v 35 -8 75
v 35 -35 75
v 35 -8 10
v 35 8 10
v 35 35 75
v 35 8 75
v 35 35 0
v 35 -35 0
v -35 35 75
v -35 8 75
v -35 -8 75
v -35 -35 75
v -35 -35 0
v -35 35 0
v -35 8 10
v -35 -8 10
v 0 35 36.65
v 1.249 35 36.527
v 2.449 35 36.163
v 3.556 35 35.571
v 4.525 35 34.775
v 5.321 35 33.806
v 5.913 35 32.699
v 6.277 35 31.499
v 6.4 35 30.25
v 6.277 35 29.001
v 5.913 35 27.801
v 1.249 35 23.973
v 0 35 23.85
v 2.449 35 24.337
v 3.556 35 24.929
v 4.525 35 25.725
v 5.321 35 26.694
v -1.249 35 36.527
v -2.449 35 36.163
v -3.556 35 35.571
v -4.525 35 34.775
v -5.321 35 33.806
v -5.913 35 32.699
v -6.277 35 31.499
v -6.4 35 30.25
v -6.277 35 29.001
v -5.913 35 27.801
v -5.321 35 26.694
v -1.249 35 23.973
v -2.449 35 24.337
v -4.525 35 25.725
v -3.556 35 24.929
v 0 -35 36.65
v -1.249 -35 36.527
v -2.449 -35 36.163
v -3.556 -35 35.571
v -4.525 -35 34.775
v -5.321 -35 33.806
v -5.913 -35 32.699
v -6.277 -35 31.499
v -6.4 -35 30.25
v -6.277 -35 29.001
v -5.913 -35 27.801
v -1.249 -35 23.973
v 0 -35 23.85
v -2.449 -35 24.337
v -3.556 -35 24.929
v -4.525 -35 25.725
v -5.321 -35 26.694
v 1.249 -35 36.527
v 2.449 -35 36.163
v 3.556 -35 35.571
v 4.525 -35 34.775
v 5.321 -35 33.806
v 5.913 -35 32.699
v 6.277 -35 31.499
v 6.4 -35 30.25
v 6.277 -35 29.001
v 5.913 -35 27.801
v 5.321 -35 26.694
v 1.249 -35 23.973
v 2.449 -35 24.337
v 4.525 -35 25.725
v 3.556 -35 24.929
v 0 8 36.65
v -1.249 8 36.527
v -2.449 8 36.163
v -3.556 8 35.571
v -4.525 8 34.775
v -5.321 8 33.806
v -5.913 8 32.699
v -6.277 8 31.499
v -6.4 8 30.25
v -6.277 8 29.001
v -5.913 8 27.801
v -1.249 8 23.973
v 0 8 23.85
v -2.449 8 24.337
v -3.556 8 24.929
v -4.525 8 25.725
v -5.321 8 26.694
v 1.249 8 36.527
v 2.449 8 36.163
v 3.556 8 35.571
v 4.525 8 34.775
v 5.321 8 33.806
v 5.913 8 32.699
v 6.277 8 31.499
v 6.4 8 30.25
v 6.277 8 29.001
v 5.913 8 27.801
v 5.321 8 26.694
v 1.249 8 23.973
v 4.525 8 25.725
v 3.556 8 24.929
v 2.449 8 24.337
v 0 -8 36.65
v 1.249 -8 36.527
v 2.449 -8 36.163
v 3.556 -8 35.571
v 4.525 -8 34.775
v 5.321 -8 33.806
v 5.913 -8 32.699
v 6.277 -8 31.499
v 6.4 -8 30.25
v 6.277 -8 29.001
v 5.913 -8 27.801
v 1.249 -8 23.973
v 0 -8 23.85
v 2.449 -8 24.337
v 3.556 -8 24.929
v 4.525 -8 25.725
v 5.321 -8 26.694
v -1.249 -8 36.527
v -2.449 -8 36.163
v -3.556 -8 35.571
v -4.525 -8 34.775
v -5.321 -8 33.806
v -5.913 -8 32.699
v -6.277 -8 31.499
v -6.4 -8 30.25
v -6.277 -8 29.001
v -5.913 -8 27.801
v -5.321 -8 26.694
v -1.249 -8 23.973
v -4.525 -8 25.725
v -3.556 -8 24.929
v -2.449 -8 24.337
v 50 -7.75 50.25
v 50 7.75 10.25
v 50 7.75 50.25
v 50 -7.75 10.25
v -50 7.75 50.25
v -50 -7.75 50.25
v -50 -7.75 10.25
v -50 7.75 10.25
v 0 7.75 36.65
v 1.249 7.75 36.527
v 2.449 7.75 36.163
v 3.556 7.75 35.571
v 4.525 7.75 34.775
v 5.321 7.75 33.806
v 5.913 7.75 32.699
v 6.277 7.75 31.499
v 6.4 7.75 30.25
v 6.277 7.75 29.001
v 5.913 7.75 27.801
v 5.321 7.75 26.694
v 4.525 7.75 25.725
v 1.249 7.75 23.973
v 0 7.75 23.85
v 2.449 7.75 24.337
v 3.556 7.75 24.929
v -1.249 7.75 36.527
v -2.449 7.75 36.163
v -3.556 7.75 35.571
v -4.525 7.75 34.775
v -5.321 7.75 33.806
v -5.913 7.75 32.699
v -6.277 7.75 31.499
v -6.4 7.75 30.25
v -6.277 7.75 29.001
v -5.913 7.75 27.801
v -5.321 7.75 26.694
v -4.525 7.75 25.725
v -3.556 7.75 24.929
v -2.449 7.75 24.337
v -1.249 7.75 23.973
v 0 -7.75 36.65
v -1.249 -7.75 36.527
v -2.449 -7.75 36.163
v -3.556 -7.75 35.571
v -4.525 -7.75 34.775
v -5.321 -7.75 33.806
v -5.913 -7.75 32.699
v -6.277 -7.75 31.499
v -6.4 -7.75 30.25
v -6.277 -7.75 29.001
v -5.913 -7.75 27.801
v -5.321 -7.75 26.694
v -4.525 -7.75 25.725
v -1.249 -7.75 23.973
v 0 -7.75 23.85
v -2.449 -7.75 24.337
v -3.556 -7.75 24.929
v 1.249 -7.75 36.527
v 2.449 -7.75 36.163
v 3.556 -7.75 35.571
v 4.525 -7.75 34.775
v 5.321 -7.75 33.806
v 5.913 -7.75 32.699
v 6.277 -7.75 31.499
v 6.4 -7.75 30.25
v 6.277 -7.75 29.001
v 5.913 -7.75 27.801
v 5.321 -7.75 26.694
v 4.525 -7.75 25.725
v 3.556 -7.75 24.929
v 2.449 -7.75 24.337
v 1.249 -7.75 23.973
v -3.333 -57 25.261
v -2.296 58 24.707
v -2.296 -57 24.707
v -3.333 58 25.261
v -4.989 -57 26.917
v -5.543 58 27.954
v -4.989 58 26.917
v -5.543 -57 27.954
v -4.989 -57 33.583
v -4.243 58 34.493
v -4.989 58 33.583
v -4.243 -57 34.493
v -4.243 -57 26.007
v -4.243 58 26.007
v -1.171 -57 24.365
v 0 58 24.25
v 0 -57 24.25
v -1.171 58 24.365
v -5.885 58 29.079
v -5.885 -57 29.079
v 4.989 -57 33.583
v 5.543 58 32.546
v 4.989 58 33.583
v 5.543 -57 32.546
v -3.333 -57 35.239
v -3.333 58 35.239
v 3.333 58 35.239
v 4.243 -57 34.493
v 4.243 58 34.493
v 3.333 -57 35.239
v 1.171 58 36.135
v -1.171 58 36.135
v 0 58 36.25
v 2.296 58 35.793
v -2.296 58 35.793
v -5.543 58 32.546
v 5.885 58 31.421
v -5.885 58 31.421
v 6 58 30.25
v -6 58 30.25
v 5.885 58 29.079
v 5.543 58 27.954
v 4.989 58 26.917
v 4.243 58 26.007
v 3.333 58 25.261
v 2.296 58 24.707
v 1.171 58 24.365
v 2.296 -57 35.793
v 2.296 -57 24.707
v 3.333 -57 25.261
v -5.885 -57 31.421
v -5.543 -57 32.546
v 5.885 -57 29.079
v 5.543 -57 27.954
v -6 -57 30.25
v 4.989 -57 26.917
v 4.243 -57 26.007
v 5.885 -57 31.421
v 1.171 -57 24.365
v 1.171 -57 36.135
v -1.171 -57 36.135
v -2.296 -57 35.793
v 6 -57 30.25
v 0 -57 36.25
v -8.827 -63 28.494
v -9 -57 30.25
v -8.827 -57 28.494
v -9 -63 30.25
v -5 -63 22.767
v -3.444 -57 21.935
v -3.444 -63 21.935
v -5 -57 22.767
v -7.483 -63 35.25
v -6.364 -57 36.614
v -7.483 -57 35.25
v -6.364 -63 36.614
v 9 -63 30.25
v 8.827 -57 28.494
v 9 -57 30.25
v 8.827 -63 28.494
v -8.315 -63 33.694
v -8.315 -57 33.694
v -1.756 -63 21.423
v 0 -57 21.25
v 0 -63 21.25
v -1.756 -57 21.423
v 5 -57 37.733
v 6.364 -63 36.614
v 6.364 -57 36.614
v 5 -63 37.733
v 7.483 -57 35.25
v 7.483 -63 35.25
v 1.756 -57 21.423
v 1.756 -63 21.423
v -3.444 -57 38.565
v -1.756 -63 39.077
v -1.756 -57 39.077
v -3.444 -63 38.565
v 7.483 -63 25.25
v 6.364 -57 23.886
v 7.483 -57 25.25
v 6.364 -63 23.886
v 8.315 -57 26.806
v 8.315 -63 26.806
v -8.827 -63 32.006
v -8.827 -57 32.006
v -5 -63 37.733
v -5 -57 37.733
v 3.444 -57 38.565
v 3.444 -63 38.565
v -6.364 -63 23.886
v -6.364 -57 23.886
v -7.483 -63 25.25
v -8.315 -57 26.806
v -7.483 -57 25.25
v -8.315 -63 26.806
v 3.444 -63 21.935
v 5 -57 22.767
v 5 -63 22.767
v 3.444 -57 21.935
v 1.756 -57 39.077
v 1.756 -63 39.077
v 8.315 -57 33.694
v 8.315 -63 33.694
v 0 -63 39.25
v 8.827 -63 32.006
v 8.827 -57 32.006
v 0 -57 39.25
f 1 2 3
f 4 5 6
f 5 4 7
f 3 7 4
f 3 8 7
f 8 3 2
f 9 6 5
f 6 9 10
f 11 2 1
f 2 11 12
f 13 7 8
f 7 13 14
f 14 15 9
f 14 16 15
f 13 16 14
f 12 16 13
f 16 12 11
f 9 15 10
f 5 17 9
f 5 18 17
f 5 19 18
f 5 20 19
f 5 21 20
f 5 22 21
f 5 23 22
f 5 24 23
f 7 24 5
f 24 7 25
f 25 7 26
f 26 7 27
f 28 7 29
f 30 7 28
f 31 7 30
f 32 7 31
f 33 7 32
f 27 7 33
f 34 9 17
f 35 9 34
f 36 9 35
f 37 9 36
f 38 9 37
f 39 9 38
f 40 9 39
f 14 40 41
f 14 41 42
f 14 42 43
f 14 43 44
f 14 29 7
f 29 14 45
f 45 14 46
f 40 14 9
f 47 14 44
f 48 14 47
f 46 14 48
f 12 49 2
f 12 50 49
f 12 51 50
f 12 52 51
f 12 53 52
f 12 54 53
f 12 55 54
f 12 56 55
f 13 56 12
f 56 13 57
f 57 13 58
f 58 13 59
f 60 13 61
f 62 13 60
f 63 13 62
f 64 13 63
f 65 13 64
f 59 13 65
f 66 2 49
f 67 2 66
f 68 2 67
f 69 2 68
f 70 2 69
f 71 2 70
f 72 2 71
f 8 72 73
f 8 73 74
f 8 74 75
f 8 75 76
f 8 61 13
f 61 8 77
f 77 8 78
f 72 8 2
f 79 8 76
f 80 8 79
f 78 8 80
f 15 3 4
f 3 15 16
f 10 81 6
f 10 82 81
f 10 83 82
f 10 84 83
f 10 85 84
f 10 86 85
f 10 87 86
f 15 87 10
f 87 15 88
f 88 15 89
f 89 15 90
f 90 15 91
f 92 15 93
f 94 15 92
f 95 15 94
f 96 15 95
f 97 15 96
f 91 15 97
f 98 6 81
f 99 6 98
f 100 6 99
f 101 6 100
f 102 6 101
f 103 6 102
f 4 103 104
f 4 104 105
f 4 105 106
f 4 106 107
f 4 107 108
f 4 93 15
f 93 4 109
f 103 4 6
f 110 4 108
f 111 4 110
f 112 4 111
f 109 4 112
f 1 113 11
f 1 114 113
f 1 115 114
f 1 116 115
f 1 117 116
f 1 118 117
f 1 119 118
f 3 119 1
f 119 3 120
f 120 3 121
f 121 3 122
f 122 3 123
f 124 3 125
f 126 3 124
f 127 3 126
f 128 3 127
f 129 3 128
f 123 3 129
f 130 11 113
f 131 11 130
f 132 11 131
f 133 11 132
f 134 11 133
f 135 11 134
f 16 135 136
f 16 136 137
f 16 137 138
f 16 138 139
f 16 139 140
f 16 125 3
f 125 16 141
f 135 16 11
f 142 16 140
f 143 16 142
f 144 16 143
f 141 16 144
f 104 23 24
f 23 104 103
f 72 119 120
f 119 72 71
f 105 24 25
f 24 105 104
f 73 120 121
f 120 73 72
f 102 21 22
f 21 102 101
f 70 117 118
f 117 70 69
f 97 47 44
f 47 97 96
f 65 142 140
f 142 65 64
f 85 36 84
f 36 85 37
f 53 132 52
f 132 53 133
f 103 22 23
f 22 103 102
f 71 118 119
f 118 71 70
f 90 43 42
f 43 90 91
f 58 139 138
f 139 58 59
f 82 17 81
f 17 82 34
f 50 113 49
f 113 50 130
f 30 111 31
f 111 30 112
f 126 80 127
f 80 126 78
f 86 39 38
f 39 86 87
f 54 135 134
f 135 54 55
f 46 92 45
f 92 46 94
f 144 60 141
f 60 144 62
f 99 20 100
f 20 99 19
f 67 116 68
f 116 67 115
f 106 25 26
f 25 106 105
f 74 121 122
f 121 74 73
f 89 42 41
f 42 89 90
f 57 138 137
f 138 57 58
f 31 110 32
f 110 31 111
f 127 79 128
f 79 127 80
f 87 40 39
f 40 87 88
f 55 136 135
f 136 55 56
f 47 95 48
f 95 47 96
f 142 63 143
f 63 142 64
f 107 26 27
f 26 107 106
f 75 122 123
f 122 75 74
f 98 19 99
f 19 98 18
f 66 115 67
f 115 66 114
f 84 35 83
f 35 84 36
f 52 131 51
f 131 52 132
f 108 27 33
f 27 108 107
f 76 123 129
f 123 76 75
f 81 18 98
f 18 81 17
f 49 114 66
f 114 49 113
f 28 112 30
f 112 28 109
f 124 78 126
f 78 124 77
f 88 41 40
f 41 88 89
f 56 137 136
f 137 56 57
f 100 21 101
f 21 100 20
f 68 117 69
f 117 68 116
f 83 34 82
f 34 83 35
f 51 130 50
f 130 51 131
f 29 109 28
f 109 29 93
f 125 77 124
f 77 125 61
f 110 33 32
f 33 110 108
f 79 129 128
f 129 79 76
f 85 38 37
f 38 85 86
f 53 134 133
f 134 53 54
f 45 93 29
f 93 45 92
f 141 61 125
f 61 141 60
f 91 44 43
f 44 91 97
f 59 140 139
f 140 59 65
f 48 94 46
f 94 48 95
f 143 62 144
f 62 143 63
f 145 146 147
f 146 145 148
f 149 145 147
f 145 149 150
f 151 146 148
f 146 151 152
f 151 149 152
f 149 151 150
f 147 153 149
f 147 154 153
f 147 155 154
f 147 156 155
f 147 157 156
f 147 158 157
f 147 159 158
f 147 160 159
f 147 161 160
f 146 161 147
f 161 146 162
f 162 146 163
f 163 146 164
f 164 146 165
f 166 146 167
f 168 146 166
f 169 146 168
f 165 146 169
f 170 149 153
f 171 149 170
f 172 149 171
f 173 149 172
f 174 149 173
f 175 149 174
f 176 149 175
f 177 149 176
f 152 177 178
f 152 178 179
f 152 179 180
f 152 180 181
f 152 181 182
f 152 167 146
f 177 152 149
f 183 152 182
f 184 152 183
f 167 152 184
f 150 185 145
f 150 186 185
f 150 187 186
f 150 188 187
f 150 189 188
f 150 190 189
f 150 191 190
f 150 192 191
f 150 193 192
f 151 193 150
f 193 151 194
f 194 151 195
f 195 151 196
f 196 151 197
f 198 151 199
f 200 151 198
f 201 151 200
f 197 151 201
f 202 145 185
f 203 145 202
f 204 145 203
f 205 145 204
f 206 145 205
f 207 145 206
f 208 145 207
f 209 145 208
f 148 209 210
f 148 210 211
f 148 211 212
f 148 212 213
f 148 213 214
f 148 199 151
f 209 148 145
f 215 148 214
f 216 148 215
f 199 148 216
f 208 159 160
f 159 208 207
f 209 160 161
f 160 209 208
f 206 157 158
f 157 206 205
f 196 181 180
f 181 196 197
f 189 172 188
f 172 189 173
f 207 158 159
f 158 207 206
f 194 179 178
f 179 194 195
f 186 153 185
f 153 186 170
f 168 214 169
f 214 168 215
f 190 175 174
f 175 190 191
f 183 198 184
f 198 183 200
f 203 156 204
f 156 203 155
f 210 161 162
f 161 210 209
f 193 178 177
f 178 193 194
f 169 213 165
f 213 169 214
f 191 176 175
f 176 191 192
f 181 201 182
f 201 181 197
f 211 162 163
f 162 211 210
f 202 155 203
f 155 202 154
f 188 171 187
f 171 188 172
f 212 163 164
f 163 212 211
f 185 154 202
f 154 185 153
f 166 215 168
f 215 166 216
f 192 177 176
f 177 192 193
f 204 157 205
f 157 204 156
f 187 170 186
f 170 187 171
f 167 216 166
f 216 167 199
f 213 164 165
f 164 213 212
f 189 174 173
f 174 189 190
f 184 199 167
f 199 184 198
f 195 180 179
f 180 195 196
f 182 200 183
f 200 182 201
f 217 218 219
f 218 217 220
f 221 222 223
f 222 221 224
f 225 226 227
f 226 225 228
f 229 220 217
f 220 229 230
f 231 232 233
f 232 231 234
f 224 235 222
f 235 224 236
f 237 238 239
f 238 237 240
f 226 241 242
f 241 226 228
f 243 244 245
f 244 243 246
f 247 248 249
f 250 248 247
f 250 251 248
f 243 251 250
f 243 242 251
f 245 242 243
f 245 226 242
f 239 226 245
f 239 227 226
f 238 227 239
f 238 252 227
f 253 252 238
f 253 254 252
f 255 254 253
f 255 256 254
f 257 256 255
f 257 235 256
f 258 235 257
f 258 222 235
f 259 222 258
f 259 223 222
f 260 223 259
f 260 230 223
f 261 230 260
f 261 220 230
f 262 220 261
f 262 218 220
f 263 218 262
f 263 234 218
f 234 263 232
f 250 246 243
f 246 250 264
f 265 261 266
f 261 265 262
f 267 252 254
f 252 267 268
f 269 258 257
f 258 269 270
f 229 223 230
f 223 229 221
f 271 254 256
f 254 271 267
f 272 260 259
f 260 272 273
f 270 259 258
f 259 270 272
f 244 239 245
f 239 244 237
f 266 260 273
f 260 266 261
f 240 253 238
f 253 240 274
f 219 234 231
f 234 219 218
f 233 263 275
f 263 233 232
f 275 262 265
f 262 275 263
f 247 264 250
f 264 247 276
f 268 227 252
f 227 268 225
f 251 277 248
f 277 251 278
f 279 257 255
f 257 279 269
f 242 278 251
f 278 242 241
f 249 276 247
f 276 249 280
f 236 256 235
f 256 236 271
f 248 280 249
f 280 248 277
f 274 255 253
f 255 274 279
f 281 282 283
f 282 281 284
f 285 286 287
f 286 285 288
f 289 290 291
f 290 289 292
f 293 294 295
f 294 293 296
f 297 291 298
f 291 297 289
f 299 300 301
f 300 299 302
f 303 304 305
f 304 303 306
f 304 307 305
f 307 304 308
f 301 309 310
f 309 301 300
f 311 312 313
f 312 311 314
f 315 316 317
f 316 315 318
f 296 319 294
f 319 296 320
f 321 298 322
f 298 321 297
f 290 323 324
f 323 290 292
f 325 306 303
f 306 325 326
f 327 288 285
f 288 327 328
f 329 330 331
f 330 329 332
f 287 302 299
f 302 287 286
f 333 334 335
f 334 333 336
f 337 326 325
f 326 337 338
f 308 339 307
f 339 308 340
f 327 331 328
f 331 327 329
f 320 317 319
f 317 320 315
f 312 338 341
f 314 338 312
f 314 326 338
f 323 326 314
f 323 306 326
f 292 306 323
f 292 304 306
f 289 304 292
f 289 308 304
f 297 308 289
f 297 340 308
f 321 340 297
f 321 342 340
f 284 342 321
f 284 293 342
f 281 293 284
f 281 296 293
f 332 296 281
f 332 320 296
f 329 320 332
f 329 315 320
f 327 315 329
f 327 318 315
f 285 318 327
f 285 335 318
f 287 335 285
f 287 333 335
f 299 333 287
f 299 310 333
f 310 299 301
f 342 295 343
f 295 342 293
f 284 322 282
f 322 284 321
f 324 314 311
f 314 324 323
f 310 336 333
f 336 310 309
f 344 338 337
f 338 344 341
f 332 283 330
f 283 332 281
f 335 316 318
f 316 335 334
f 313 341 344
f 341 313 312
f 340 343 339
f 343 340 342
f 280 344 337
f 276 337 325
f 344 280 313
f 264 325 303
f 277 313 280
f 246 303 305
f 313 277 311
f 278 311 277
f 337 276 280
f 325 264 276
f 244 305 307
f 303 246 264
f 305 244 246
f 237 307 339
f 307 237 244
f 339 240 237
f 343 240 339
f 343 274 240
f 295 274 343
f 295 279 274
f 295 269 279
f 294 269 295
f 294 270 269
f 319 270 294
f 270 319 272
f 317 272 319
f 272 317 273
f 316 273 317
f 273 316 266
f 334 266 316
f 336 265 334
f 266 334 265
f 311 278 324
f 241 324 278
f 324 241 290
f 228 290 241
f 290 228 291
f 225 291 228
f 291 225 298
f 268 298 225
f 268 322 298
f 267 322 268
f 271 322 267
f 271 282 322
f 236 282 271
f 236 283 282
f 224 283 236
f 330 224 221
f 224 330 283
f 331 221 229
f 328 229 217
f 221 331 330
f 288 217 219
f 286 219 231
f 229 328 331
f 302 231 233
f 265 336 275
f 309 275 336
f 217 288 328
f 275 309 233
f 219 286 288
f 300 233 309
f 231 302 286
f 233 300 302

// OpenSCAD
$fn = 32;

// ------------------------------------------------------------------------
// Clevis joint: 70 mm clevis, pin d12
// Every part is its own module, assembly() places them once.
// ------------------------------------------------------------------------

// --- part 1 ---
module clevis() {
  difference() {
    translate([-35, -35, 0]) cube([70, 70, 75]);
    translate([-36, -8, 10]) cube([72, 16, 66]);
    translate([0, 0, 30.25]) rotate([90, 0, 0]) cylinder(h = 72, d = 12.8, center = true);
  }
}

// --- part 2 ---
module eye() {
  difference() {
    translate([-50, -7.75, 0]) cube([100, 15.5, 40]);
    translate([0, 0, 20]) rotate([90, 0, 0]) cylinder(h = 17.5, d = 12.8, center = true);
  }
}

// --- part 3 ---
module pin() {
  rotate([0, 90, 0]) cylinder(h = 116, d = 12, center = true);
  translate([-63, 0, 0]) rotate([0, 90, 0]) cylinder(h = 6, d = 18);
}

// --- assembly ---
module assembly() {
  translate([0, 0, 0]) rotate([0, 0, 0]) clevis();
  translate([0, 0, 10.25]) rotate([0, 0, 0]) eye();
  translate([0, 0, 30.25]) rotate([0, 0, 90]) pin();
}

assembly();
